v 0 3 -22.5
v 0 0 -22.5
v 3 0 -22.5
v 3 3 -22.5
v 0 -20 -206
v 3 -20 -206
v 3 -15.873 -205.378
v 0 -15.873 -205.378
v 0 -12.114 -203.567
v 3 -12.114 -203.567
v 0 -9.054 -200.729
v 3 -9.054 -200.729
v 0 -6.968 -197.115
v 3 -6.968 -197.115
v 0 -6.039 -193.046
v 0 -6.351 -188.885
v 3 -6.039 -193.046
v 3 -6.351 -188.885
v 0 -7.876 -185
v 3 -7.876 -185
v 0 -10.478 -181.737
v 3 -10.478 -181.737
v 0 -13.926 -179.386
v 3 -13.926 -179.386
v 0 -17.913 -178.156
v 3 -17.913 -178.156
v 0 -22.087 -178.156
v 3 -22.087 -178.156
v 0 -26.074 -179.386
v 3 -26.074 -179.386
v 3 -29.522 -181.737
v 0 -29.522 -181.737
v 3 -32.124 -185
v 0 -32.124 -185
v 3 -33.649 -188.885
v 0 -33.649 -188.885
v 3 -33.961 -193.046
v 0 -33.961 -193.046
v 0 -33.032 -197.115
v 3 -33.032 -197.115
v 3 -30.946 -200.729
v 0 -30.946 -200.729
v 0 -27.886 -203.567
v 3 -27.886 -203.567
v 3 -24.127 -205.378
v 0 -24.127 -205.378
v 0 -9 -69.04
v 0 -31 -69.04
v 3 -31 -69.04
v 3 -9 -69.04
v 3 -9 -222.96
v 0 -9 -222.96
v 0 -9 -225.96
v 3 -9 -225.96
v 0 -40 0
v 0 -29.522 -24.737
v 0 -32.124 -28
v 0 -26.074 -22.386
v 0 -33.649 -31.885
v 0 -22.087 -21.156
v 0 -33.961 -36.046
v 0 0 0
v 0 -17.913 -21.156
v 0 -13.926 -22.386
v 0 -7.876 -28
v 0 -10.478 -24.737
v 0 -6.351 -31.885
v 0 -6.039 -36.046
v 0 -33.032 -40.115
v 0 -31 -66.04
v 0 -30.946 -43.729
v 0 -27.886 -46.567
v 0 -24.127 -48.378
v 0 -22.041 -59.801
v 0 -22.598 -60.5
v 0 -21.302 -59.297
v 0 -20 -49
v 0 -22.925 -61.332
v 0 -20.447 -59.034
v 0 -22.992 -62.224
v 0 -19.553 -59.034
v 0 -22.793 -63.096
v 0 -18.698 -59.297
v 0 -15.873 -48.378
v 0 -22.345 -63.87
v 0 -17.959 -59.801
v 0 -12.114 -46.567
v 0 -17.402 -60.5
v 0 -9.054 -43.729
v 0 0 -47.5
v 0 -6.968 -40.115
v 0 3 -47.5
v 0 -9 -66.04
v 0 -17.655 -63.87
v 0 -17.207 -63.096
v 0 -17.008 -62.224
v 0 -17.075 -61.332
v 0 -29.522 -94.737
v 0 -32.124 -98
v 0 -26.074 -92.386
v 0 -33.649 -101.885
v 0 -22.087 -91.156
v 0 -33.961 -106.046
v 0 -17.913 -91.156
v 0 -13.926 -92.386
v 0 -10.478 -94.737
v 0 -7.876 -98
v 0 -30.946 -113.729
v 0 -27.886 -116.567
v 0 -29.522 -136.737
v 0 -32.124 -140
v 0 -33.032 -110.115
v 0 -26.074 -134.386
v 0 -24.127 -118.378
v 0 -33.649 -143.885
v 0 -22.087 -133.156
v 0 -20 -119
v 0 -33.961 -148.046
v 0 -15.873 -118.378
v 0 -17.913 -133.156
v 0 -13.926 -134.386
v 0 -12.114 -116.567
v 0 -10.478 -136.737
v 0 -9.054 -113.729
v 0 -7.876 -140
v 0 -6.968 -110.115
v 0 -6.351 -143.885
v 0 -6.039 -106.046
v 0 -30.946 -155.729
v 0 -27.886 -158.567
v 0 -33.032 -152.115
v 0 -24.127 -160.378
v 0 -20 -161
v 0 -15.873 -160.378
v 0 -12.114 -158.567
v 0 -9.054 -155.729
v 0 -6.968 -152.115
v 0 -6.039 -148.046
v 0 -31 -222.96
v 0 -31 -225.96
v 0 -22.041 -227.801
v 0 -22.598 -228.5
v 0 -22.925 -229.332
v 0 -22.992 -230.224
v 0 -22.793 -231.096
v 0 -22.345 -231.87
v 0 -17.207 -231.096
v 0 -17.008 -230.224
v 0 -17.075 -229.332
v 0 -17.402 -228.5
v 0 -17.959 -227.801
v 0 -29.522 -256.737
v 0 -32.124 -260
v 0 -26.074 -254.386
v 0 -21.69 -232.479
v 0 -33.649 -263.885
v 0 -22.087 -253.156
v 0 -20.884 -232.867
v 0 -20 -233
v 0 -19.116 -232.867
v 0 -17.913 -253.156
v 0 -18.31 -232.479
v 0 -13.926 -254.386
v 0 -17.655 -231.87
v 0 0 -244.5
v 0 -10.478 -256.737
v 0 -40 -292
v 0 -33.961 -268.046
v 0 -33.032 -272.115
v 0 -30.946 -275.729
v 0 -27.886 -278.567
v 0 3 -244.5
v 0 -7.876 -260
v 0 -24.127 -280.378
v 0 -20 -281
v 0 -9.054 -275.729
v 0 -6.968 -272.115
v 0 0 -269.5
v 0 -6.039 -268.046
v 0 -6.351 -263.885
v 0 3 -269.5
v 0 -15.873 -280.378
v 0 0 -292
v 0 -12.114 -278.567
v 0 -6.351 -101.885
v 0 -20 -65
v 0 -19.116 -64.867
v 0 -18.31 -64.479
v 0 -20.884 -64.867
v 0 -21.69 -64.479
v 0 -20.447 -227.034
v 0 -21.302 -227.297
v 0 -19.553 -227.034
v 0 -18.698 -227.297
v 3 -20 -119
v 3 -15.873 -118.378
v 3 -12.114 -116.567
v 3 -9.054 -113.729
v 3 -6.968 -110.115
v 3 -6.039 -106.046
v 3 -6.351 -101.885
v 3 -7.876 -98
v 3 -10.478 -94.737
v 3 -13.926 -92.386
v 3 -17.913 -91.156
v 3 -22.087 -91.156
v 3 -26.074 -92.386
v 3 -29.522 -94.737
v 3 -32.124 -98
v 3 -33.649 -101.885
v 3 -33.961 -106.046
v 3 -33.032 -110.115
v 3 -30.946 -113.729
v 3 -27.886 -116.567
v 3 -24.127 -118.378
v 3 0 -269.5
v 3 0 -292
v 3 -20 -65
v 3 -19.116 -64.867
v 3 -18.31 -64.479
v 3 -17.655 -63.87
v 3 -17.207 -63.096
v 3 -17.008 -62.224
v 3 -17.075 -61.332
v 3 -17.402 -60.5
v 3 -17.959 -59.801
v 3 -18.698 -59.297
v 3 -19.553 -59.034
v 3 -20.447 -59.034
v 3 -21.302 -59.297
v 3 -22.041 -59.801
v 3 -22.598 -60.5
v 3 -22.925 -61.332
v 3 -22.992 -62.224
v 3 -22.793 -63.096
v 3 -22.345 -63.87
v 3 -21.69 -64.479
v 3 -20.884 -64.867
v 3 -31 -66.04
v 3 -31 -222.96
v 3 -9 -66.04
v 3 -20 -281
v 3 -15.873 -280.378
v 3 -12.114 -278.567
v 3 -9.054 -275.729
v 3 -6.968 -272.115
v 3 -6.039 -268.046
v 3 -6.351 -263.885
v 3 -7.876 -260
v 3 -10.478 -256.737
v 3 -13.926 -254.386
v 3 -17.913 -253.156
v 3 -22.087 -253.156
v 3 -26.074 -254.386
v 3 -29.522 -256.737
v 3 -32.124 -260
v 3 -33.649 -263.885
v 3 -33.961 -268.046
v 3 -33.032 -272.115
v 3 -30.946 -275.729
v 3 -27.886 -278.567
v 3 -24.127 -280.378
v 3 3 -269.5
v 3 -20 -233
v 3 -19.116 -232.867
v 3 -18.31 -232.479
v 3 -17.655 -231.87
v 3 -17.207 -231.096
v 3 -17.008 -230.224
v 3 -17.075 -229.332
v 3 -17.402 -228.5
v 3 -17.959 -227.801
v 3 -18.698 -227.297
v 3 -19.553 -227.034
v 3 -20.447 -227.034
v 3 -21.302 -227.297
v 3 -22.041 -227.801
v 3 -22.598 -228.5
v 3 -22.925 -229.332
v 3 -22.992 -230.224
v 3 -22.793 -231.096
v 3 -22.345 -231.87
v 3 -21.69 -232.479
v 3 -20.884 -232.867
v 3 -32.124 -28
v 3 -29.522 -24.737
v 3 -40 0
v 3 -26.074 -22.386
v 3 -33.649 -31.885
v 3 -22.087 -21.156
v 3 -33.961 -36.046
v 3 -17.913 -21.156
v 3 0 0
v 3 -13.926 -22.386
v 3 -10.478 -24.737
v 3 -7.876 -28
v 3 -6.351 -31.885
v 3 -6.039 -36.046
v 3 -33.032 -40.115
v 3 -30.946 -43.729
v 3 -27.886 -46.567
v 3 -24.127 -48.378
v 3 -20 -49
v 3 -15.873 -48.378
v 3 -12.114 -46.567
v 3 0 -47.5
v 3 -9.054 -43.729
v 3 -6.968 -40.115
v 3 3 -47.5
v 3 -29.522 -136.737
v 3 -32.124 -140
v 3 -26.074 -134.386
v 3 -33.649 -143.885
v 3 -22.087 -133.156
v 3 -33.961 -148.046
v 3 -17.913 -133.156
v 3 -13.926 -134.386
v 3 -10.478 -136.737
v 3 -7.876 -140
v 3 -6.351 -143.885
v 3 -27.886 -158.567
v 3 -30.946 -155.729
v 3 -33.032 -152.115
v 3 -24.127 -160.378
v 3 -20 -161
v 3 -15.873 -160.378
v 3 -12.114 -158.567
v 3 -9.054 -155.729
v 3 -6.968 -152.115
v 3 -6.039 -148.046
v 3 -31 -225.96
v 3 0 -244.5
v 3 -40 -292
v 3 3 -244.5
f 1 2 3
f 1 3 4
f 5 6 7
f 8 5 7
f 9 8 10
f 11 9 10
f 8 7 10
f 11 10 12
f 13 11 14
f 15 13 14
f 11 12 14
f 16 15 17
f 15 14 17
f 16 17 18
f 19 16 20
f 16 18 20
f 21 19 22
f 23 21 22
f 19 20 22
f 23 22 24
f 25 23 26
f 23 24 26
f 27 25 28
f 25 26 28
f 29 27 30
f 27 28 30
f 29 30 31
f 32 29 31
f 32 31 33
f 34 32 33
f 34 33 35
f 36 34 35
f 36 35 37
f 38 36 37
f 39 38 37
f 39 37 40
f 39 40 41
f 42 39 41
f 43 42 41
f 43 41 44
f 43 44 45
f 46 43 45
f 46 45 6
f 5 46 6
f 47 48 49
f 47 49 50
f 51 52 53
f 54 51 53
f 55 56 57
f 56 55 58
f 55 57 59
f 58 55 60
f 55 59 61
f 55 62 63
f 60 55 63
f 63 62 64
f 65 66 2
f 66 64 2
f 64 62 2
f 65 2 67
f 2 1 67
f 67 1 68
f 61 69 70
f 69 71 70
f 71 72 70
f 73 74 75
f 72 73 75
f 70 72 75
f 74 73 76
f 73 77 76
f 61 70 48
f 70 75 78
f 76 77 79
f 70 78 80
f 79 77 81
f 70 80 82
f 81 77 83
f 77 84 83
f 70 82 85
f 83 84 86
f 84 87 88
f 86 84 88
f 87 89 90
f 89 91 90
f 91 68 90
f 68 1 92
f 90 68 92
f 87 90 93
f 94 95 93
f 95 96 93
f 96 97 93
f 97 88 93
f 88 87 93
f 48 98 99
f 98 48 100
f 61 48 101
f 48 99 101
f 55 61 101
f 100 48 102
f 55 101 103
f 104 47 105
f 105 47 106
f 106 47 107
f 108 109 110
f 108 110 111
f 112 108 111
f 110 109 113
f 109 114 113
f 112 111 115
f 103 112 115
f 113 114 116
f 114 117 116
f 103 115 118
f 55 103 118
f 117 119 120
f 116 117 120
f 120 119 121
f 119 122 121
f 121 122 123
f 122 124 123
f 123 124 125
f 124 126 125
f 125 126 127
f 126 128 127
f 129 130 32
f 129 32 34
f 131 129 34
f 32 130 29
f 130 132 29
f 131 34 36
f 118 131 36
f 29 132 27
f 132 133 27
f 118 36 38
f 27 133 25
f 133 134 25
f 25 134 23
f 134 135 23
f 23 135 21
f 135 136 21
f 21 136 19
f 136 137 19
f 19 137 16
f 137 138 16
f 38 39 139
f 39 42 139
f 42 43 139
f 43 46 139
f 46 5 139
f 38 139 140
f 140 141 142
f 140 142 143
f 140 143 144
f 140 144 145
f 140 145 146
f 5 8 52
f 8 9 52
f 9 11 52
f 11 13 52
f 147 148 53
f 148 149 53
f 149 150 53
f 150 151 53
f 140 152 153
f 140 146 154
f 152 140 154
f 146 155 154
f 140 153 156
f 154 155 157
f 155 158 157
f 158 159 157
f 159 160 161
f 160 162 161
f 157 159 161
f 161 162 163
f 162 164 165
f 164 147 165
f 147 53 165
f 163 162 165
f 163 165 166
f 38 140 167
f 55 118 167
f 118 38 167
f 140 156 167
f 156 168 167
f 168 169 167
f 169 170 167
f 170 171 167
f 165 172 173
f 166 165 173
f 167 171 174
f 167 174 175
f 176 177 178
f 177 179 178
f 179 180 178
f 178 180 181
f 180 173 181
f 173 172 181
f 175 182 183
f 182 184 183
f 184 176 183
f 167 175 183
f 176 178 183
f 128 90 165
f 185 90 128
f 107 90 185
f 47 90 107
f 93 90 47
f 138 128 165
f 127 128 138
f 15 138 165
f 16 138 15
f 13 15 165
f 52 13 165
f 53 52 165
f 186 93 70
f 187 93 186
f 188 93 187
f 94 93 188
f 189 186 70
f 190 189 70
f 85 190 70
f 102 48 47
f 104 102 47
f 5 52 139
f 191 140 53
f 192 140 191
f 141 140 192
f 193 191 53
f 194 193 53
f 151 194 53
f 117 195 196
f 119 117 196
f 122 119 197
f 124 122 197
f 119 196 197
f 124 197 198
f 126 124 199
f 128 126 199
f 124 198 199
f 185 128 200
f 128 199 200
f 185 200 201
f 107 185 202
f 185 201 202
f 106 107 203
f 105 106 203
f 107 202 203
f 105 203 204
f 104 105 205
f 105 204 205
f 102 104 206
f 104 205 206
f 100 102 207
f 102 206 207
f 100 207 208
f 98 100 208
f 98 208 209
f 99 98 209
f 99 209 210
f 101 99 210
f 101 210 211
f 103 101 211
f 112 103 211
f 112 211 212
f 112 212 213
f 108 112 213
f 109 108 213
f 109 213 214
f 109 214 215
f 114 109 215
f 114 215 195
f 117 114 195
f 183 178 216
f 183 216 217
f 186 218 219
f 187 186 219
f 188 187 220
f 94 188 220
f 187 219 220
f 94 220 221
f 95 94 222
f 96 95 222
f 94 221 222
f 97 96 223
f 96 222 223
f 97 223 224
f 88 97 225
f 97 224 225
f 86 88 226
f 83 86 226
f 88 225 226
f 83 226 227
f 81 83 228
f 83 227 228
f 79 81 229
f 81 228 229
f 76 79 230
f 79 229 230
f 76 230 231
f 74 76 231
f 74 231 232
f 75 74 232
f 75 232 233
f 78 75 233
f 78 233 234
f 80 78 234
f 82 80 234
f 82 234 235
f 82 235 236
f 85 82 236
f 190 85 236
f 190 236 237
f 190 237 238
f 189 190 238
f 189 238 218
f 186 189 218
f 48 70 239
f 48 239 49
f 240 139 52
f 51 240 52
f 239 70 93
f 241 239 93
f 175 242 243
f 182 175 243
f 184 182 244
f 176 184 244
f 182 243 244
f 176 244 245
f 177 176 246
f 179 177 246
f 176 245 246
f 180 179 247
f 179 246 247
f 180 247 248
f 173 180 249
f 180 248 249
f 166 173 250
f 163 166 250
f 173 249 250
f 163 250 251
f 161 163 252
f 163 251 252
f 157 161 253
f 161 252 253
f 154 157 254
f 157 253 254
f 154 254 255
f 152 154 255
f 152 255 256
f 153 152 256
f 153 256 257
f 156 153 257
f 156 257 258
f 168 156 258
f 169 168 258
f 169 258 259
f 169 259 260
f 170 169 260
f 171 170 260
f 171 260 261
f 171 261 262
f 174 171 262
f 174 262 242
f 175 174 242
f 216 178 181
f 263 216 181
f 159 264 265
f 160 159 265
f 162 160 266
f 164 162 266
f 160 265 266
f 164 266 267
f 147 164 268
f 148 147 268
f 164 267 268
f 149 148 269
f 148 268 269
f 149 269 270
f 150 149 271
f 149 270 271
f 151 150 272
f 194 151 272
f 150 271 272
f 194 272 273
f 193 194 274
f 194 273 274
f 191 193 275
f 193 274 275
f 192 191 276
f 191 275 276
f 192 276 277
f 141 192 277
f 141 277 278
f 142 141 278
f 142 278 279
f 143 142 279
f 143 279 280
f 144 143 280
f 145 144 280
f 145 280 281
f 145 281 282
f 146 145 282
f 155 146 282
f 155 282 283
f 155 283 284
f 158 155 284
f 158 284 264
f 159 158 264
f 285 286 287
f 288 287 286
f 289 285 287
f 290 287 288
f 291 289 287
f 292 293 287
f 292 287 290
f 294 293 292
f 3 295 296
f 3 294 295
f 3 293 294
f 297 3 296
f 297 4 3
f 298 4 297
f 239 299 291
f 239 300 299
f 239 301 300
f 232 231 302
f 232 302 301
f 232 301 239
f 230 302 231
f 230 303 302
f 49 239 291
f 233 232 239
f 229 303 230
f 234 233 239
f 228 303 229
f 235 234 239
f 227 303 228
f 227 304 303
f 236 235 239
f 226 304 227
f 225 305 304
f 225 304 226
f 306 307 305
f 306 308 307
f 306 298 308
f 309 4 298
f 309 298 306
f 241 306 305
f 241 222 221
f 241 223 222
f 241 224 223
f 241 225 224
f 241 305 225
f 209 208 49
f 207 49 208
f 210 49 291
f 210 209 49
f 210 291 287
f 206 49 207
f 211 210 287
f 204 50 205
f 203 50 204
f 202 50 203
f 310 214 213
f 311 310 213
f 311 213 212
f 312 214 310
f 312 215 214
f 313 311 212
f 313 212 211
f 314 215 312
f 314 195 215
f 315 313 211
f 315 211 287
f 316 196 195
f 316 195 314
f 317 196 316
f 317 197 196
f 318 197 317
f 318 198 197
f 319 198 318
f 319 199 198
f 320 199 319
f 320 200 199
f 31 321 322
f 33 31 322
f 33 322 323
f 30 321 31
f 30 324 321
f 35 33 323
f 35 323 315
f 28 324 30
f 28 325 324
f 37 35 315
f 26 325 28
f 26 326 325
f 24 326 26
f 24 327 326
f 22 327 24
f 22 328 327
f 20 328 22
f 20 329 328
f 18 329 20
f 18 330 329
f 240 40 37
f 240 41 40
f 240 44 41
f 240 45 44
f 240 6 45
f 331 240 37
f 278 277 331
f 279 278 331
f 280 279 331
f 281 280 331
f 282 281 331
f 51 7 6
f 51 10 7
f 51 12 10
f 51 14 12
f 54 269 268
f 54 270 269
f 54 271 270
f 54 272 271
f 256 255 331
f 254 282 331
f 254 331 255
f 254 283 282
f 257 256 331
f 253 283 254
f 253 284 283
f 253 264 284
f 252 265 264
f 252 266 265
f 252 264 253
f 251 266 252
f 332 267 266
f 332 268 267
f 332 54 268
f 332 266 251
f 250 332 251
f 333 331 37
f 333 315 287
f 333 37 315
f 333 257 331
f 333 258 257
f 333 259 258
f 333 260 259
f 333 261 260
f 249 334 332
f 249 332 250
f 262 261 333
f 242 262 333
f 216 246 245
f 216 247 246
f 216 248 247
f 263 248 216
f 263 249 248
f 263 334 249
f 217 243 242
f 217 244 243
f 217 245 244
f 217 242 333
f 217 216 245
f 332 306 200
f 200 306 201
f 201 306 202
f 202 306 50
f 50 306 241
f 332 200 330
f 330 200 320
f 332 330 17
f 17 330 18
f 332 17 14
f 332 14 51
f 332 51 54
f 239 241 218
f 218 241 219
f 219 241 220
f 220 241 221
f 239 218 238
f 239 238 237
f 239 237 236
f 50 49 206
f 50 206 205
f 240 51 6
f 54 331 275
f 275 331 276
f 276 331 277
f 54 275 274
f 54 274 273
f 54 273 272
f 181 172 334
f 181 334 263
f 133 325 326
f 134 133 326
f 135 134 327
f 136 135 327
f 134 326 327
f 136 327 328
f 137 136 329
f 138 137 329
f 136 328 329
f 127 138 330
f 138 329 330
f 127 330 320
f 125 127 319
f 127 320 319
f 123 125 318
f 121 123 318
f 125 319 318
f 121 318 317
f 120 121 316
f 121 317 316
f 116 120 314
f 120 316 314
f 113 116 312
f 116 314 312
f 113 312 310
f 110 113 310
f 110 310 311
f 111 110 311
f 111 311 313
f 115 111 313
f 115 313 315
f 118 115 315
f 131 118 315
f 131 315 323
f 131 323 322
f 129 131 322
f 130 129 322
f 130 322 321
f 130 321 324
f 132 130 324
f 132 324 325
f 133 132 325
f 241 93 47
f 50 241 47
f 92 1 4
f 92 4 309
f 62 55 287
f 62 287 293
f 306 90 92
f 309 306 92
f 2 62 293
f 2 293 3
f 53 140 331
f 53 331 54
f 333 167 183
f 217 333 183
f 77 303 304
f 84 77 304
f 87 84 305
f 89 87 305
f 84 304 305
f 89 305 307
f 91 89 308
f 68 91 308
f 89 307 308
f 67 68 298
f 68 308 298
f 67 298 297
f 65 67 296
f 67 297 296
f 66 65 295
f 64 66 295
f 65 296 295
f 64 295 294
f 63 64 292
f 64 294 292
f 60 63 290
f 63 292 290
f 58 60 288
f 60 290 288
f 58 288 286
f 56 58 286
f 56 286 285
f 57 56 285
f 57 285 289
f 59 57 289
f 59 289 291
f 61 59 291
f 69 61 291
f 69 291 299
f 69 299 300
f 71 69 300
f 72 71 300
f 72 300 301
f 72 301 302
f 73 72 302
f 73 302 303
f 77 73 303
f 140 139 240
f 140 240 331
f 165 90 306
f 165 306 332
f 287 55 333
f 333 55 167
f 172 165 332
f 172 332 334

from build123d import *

# Parameters (mm, degrees)
SKETCH3_W           = 292
SKETCH3_H           = 40
SKETCH3_W_2         = 3
SKETCH3_H_2         = 22
SKETCH3_W_3         = 25
SKETCH3_H_3         = 3
BOSS_EXTRUDE2_DEPTH = 3
SKETCH5_R           = 14
CUT_EXTRUDE1_DEPTH  = 10
SKETCH6_R           = 3
CUT_EXTRUDE2_DEPTH  = 10


with BuildPart() as part:
    # Sketch3 → Boss-Extrude2 (new body)
    with BuildSketch(Plane(origin=(0, 0, 0), x_dir=(0, 0, -1), z_dir=(1, 0, 0))):
        with Locations((146, -20)):
            Rectangle(SKETCH3_W, SKETCH3_H)
        with Locations((67.54, -20)):
            Rectangle(SKETCH3_W_2, SKETCH3_H_2, mode=Mode.SUBTRACT)
        with Locations((224.46, -20)):
            Rectangle(SKETCH3_W_2, SKETCH3_H_2, mode=Mode.SUBTRACT)
        with Locations((35, 1.5)):
            Rectangle(SKETCH3_W_3, SKETCH3_H_3)
        with Locations((257, 1.5)):
            Rectangle(SKETCH3_W_3, SKETCH3_H_3)
    extrude(amount=BOSS_EXTRUDE2_DEPTH)

    # Sketch5 → Cut-Extrude1 (cut)
    with BuildSketch(Plane(origin=(3, 0, 0), x_dir=(0, 0, -1), z_dir=(1, 0, 0))):
        with Locations((35, -20)):
            Circle(SKETCH5_R)
        with Locations((105, -20)):
            Circle(SKETCH5_R)
        with Locations((147, -20)):
            Circle(SKETCH5_R)
        with Locations((192, -20)):
            Circle(SKETCH5_R)
        with Locations((267, -20)):
            Circle(SKETCH5_R)
    extrude(amount=-CUT_EXTRUDE1_DEPTH, mode=Mode.SUBTRACT)

    # Sketch6 → Cut-Extrude2 (cut)
    with BuildSketch(Plane(origin=(3, 0, 0), x_dir=(0, 0, -1), z_dir=(1, 0, 0))):
        with Locations((62, -20)):
            Circle(SKETCH6_R)
        with Locations((230, -20)):
            Circle(SKETCH6_R)
    extrude(amount=-CUT_EXTRUDE2_DEPTH, mode=Mode.SUBTRACT)


solid = part.part
